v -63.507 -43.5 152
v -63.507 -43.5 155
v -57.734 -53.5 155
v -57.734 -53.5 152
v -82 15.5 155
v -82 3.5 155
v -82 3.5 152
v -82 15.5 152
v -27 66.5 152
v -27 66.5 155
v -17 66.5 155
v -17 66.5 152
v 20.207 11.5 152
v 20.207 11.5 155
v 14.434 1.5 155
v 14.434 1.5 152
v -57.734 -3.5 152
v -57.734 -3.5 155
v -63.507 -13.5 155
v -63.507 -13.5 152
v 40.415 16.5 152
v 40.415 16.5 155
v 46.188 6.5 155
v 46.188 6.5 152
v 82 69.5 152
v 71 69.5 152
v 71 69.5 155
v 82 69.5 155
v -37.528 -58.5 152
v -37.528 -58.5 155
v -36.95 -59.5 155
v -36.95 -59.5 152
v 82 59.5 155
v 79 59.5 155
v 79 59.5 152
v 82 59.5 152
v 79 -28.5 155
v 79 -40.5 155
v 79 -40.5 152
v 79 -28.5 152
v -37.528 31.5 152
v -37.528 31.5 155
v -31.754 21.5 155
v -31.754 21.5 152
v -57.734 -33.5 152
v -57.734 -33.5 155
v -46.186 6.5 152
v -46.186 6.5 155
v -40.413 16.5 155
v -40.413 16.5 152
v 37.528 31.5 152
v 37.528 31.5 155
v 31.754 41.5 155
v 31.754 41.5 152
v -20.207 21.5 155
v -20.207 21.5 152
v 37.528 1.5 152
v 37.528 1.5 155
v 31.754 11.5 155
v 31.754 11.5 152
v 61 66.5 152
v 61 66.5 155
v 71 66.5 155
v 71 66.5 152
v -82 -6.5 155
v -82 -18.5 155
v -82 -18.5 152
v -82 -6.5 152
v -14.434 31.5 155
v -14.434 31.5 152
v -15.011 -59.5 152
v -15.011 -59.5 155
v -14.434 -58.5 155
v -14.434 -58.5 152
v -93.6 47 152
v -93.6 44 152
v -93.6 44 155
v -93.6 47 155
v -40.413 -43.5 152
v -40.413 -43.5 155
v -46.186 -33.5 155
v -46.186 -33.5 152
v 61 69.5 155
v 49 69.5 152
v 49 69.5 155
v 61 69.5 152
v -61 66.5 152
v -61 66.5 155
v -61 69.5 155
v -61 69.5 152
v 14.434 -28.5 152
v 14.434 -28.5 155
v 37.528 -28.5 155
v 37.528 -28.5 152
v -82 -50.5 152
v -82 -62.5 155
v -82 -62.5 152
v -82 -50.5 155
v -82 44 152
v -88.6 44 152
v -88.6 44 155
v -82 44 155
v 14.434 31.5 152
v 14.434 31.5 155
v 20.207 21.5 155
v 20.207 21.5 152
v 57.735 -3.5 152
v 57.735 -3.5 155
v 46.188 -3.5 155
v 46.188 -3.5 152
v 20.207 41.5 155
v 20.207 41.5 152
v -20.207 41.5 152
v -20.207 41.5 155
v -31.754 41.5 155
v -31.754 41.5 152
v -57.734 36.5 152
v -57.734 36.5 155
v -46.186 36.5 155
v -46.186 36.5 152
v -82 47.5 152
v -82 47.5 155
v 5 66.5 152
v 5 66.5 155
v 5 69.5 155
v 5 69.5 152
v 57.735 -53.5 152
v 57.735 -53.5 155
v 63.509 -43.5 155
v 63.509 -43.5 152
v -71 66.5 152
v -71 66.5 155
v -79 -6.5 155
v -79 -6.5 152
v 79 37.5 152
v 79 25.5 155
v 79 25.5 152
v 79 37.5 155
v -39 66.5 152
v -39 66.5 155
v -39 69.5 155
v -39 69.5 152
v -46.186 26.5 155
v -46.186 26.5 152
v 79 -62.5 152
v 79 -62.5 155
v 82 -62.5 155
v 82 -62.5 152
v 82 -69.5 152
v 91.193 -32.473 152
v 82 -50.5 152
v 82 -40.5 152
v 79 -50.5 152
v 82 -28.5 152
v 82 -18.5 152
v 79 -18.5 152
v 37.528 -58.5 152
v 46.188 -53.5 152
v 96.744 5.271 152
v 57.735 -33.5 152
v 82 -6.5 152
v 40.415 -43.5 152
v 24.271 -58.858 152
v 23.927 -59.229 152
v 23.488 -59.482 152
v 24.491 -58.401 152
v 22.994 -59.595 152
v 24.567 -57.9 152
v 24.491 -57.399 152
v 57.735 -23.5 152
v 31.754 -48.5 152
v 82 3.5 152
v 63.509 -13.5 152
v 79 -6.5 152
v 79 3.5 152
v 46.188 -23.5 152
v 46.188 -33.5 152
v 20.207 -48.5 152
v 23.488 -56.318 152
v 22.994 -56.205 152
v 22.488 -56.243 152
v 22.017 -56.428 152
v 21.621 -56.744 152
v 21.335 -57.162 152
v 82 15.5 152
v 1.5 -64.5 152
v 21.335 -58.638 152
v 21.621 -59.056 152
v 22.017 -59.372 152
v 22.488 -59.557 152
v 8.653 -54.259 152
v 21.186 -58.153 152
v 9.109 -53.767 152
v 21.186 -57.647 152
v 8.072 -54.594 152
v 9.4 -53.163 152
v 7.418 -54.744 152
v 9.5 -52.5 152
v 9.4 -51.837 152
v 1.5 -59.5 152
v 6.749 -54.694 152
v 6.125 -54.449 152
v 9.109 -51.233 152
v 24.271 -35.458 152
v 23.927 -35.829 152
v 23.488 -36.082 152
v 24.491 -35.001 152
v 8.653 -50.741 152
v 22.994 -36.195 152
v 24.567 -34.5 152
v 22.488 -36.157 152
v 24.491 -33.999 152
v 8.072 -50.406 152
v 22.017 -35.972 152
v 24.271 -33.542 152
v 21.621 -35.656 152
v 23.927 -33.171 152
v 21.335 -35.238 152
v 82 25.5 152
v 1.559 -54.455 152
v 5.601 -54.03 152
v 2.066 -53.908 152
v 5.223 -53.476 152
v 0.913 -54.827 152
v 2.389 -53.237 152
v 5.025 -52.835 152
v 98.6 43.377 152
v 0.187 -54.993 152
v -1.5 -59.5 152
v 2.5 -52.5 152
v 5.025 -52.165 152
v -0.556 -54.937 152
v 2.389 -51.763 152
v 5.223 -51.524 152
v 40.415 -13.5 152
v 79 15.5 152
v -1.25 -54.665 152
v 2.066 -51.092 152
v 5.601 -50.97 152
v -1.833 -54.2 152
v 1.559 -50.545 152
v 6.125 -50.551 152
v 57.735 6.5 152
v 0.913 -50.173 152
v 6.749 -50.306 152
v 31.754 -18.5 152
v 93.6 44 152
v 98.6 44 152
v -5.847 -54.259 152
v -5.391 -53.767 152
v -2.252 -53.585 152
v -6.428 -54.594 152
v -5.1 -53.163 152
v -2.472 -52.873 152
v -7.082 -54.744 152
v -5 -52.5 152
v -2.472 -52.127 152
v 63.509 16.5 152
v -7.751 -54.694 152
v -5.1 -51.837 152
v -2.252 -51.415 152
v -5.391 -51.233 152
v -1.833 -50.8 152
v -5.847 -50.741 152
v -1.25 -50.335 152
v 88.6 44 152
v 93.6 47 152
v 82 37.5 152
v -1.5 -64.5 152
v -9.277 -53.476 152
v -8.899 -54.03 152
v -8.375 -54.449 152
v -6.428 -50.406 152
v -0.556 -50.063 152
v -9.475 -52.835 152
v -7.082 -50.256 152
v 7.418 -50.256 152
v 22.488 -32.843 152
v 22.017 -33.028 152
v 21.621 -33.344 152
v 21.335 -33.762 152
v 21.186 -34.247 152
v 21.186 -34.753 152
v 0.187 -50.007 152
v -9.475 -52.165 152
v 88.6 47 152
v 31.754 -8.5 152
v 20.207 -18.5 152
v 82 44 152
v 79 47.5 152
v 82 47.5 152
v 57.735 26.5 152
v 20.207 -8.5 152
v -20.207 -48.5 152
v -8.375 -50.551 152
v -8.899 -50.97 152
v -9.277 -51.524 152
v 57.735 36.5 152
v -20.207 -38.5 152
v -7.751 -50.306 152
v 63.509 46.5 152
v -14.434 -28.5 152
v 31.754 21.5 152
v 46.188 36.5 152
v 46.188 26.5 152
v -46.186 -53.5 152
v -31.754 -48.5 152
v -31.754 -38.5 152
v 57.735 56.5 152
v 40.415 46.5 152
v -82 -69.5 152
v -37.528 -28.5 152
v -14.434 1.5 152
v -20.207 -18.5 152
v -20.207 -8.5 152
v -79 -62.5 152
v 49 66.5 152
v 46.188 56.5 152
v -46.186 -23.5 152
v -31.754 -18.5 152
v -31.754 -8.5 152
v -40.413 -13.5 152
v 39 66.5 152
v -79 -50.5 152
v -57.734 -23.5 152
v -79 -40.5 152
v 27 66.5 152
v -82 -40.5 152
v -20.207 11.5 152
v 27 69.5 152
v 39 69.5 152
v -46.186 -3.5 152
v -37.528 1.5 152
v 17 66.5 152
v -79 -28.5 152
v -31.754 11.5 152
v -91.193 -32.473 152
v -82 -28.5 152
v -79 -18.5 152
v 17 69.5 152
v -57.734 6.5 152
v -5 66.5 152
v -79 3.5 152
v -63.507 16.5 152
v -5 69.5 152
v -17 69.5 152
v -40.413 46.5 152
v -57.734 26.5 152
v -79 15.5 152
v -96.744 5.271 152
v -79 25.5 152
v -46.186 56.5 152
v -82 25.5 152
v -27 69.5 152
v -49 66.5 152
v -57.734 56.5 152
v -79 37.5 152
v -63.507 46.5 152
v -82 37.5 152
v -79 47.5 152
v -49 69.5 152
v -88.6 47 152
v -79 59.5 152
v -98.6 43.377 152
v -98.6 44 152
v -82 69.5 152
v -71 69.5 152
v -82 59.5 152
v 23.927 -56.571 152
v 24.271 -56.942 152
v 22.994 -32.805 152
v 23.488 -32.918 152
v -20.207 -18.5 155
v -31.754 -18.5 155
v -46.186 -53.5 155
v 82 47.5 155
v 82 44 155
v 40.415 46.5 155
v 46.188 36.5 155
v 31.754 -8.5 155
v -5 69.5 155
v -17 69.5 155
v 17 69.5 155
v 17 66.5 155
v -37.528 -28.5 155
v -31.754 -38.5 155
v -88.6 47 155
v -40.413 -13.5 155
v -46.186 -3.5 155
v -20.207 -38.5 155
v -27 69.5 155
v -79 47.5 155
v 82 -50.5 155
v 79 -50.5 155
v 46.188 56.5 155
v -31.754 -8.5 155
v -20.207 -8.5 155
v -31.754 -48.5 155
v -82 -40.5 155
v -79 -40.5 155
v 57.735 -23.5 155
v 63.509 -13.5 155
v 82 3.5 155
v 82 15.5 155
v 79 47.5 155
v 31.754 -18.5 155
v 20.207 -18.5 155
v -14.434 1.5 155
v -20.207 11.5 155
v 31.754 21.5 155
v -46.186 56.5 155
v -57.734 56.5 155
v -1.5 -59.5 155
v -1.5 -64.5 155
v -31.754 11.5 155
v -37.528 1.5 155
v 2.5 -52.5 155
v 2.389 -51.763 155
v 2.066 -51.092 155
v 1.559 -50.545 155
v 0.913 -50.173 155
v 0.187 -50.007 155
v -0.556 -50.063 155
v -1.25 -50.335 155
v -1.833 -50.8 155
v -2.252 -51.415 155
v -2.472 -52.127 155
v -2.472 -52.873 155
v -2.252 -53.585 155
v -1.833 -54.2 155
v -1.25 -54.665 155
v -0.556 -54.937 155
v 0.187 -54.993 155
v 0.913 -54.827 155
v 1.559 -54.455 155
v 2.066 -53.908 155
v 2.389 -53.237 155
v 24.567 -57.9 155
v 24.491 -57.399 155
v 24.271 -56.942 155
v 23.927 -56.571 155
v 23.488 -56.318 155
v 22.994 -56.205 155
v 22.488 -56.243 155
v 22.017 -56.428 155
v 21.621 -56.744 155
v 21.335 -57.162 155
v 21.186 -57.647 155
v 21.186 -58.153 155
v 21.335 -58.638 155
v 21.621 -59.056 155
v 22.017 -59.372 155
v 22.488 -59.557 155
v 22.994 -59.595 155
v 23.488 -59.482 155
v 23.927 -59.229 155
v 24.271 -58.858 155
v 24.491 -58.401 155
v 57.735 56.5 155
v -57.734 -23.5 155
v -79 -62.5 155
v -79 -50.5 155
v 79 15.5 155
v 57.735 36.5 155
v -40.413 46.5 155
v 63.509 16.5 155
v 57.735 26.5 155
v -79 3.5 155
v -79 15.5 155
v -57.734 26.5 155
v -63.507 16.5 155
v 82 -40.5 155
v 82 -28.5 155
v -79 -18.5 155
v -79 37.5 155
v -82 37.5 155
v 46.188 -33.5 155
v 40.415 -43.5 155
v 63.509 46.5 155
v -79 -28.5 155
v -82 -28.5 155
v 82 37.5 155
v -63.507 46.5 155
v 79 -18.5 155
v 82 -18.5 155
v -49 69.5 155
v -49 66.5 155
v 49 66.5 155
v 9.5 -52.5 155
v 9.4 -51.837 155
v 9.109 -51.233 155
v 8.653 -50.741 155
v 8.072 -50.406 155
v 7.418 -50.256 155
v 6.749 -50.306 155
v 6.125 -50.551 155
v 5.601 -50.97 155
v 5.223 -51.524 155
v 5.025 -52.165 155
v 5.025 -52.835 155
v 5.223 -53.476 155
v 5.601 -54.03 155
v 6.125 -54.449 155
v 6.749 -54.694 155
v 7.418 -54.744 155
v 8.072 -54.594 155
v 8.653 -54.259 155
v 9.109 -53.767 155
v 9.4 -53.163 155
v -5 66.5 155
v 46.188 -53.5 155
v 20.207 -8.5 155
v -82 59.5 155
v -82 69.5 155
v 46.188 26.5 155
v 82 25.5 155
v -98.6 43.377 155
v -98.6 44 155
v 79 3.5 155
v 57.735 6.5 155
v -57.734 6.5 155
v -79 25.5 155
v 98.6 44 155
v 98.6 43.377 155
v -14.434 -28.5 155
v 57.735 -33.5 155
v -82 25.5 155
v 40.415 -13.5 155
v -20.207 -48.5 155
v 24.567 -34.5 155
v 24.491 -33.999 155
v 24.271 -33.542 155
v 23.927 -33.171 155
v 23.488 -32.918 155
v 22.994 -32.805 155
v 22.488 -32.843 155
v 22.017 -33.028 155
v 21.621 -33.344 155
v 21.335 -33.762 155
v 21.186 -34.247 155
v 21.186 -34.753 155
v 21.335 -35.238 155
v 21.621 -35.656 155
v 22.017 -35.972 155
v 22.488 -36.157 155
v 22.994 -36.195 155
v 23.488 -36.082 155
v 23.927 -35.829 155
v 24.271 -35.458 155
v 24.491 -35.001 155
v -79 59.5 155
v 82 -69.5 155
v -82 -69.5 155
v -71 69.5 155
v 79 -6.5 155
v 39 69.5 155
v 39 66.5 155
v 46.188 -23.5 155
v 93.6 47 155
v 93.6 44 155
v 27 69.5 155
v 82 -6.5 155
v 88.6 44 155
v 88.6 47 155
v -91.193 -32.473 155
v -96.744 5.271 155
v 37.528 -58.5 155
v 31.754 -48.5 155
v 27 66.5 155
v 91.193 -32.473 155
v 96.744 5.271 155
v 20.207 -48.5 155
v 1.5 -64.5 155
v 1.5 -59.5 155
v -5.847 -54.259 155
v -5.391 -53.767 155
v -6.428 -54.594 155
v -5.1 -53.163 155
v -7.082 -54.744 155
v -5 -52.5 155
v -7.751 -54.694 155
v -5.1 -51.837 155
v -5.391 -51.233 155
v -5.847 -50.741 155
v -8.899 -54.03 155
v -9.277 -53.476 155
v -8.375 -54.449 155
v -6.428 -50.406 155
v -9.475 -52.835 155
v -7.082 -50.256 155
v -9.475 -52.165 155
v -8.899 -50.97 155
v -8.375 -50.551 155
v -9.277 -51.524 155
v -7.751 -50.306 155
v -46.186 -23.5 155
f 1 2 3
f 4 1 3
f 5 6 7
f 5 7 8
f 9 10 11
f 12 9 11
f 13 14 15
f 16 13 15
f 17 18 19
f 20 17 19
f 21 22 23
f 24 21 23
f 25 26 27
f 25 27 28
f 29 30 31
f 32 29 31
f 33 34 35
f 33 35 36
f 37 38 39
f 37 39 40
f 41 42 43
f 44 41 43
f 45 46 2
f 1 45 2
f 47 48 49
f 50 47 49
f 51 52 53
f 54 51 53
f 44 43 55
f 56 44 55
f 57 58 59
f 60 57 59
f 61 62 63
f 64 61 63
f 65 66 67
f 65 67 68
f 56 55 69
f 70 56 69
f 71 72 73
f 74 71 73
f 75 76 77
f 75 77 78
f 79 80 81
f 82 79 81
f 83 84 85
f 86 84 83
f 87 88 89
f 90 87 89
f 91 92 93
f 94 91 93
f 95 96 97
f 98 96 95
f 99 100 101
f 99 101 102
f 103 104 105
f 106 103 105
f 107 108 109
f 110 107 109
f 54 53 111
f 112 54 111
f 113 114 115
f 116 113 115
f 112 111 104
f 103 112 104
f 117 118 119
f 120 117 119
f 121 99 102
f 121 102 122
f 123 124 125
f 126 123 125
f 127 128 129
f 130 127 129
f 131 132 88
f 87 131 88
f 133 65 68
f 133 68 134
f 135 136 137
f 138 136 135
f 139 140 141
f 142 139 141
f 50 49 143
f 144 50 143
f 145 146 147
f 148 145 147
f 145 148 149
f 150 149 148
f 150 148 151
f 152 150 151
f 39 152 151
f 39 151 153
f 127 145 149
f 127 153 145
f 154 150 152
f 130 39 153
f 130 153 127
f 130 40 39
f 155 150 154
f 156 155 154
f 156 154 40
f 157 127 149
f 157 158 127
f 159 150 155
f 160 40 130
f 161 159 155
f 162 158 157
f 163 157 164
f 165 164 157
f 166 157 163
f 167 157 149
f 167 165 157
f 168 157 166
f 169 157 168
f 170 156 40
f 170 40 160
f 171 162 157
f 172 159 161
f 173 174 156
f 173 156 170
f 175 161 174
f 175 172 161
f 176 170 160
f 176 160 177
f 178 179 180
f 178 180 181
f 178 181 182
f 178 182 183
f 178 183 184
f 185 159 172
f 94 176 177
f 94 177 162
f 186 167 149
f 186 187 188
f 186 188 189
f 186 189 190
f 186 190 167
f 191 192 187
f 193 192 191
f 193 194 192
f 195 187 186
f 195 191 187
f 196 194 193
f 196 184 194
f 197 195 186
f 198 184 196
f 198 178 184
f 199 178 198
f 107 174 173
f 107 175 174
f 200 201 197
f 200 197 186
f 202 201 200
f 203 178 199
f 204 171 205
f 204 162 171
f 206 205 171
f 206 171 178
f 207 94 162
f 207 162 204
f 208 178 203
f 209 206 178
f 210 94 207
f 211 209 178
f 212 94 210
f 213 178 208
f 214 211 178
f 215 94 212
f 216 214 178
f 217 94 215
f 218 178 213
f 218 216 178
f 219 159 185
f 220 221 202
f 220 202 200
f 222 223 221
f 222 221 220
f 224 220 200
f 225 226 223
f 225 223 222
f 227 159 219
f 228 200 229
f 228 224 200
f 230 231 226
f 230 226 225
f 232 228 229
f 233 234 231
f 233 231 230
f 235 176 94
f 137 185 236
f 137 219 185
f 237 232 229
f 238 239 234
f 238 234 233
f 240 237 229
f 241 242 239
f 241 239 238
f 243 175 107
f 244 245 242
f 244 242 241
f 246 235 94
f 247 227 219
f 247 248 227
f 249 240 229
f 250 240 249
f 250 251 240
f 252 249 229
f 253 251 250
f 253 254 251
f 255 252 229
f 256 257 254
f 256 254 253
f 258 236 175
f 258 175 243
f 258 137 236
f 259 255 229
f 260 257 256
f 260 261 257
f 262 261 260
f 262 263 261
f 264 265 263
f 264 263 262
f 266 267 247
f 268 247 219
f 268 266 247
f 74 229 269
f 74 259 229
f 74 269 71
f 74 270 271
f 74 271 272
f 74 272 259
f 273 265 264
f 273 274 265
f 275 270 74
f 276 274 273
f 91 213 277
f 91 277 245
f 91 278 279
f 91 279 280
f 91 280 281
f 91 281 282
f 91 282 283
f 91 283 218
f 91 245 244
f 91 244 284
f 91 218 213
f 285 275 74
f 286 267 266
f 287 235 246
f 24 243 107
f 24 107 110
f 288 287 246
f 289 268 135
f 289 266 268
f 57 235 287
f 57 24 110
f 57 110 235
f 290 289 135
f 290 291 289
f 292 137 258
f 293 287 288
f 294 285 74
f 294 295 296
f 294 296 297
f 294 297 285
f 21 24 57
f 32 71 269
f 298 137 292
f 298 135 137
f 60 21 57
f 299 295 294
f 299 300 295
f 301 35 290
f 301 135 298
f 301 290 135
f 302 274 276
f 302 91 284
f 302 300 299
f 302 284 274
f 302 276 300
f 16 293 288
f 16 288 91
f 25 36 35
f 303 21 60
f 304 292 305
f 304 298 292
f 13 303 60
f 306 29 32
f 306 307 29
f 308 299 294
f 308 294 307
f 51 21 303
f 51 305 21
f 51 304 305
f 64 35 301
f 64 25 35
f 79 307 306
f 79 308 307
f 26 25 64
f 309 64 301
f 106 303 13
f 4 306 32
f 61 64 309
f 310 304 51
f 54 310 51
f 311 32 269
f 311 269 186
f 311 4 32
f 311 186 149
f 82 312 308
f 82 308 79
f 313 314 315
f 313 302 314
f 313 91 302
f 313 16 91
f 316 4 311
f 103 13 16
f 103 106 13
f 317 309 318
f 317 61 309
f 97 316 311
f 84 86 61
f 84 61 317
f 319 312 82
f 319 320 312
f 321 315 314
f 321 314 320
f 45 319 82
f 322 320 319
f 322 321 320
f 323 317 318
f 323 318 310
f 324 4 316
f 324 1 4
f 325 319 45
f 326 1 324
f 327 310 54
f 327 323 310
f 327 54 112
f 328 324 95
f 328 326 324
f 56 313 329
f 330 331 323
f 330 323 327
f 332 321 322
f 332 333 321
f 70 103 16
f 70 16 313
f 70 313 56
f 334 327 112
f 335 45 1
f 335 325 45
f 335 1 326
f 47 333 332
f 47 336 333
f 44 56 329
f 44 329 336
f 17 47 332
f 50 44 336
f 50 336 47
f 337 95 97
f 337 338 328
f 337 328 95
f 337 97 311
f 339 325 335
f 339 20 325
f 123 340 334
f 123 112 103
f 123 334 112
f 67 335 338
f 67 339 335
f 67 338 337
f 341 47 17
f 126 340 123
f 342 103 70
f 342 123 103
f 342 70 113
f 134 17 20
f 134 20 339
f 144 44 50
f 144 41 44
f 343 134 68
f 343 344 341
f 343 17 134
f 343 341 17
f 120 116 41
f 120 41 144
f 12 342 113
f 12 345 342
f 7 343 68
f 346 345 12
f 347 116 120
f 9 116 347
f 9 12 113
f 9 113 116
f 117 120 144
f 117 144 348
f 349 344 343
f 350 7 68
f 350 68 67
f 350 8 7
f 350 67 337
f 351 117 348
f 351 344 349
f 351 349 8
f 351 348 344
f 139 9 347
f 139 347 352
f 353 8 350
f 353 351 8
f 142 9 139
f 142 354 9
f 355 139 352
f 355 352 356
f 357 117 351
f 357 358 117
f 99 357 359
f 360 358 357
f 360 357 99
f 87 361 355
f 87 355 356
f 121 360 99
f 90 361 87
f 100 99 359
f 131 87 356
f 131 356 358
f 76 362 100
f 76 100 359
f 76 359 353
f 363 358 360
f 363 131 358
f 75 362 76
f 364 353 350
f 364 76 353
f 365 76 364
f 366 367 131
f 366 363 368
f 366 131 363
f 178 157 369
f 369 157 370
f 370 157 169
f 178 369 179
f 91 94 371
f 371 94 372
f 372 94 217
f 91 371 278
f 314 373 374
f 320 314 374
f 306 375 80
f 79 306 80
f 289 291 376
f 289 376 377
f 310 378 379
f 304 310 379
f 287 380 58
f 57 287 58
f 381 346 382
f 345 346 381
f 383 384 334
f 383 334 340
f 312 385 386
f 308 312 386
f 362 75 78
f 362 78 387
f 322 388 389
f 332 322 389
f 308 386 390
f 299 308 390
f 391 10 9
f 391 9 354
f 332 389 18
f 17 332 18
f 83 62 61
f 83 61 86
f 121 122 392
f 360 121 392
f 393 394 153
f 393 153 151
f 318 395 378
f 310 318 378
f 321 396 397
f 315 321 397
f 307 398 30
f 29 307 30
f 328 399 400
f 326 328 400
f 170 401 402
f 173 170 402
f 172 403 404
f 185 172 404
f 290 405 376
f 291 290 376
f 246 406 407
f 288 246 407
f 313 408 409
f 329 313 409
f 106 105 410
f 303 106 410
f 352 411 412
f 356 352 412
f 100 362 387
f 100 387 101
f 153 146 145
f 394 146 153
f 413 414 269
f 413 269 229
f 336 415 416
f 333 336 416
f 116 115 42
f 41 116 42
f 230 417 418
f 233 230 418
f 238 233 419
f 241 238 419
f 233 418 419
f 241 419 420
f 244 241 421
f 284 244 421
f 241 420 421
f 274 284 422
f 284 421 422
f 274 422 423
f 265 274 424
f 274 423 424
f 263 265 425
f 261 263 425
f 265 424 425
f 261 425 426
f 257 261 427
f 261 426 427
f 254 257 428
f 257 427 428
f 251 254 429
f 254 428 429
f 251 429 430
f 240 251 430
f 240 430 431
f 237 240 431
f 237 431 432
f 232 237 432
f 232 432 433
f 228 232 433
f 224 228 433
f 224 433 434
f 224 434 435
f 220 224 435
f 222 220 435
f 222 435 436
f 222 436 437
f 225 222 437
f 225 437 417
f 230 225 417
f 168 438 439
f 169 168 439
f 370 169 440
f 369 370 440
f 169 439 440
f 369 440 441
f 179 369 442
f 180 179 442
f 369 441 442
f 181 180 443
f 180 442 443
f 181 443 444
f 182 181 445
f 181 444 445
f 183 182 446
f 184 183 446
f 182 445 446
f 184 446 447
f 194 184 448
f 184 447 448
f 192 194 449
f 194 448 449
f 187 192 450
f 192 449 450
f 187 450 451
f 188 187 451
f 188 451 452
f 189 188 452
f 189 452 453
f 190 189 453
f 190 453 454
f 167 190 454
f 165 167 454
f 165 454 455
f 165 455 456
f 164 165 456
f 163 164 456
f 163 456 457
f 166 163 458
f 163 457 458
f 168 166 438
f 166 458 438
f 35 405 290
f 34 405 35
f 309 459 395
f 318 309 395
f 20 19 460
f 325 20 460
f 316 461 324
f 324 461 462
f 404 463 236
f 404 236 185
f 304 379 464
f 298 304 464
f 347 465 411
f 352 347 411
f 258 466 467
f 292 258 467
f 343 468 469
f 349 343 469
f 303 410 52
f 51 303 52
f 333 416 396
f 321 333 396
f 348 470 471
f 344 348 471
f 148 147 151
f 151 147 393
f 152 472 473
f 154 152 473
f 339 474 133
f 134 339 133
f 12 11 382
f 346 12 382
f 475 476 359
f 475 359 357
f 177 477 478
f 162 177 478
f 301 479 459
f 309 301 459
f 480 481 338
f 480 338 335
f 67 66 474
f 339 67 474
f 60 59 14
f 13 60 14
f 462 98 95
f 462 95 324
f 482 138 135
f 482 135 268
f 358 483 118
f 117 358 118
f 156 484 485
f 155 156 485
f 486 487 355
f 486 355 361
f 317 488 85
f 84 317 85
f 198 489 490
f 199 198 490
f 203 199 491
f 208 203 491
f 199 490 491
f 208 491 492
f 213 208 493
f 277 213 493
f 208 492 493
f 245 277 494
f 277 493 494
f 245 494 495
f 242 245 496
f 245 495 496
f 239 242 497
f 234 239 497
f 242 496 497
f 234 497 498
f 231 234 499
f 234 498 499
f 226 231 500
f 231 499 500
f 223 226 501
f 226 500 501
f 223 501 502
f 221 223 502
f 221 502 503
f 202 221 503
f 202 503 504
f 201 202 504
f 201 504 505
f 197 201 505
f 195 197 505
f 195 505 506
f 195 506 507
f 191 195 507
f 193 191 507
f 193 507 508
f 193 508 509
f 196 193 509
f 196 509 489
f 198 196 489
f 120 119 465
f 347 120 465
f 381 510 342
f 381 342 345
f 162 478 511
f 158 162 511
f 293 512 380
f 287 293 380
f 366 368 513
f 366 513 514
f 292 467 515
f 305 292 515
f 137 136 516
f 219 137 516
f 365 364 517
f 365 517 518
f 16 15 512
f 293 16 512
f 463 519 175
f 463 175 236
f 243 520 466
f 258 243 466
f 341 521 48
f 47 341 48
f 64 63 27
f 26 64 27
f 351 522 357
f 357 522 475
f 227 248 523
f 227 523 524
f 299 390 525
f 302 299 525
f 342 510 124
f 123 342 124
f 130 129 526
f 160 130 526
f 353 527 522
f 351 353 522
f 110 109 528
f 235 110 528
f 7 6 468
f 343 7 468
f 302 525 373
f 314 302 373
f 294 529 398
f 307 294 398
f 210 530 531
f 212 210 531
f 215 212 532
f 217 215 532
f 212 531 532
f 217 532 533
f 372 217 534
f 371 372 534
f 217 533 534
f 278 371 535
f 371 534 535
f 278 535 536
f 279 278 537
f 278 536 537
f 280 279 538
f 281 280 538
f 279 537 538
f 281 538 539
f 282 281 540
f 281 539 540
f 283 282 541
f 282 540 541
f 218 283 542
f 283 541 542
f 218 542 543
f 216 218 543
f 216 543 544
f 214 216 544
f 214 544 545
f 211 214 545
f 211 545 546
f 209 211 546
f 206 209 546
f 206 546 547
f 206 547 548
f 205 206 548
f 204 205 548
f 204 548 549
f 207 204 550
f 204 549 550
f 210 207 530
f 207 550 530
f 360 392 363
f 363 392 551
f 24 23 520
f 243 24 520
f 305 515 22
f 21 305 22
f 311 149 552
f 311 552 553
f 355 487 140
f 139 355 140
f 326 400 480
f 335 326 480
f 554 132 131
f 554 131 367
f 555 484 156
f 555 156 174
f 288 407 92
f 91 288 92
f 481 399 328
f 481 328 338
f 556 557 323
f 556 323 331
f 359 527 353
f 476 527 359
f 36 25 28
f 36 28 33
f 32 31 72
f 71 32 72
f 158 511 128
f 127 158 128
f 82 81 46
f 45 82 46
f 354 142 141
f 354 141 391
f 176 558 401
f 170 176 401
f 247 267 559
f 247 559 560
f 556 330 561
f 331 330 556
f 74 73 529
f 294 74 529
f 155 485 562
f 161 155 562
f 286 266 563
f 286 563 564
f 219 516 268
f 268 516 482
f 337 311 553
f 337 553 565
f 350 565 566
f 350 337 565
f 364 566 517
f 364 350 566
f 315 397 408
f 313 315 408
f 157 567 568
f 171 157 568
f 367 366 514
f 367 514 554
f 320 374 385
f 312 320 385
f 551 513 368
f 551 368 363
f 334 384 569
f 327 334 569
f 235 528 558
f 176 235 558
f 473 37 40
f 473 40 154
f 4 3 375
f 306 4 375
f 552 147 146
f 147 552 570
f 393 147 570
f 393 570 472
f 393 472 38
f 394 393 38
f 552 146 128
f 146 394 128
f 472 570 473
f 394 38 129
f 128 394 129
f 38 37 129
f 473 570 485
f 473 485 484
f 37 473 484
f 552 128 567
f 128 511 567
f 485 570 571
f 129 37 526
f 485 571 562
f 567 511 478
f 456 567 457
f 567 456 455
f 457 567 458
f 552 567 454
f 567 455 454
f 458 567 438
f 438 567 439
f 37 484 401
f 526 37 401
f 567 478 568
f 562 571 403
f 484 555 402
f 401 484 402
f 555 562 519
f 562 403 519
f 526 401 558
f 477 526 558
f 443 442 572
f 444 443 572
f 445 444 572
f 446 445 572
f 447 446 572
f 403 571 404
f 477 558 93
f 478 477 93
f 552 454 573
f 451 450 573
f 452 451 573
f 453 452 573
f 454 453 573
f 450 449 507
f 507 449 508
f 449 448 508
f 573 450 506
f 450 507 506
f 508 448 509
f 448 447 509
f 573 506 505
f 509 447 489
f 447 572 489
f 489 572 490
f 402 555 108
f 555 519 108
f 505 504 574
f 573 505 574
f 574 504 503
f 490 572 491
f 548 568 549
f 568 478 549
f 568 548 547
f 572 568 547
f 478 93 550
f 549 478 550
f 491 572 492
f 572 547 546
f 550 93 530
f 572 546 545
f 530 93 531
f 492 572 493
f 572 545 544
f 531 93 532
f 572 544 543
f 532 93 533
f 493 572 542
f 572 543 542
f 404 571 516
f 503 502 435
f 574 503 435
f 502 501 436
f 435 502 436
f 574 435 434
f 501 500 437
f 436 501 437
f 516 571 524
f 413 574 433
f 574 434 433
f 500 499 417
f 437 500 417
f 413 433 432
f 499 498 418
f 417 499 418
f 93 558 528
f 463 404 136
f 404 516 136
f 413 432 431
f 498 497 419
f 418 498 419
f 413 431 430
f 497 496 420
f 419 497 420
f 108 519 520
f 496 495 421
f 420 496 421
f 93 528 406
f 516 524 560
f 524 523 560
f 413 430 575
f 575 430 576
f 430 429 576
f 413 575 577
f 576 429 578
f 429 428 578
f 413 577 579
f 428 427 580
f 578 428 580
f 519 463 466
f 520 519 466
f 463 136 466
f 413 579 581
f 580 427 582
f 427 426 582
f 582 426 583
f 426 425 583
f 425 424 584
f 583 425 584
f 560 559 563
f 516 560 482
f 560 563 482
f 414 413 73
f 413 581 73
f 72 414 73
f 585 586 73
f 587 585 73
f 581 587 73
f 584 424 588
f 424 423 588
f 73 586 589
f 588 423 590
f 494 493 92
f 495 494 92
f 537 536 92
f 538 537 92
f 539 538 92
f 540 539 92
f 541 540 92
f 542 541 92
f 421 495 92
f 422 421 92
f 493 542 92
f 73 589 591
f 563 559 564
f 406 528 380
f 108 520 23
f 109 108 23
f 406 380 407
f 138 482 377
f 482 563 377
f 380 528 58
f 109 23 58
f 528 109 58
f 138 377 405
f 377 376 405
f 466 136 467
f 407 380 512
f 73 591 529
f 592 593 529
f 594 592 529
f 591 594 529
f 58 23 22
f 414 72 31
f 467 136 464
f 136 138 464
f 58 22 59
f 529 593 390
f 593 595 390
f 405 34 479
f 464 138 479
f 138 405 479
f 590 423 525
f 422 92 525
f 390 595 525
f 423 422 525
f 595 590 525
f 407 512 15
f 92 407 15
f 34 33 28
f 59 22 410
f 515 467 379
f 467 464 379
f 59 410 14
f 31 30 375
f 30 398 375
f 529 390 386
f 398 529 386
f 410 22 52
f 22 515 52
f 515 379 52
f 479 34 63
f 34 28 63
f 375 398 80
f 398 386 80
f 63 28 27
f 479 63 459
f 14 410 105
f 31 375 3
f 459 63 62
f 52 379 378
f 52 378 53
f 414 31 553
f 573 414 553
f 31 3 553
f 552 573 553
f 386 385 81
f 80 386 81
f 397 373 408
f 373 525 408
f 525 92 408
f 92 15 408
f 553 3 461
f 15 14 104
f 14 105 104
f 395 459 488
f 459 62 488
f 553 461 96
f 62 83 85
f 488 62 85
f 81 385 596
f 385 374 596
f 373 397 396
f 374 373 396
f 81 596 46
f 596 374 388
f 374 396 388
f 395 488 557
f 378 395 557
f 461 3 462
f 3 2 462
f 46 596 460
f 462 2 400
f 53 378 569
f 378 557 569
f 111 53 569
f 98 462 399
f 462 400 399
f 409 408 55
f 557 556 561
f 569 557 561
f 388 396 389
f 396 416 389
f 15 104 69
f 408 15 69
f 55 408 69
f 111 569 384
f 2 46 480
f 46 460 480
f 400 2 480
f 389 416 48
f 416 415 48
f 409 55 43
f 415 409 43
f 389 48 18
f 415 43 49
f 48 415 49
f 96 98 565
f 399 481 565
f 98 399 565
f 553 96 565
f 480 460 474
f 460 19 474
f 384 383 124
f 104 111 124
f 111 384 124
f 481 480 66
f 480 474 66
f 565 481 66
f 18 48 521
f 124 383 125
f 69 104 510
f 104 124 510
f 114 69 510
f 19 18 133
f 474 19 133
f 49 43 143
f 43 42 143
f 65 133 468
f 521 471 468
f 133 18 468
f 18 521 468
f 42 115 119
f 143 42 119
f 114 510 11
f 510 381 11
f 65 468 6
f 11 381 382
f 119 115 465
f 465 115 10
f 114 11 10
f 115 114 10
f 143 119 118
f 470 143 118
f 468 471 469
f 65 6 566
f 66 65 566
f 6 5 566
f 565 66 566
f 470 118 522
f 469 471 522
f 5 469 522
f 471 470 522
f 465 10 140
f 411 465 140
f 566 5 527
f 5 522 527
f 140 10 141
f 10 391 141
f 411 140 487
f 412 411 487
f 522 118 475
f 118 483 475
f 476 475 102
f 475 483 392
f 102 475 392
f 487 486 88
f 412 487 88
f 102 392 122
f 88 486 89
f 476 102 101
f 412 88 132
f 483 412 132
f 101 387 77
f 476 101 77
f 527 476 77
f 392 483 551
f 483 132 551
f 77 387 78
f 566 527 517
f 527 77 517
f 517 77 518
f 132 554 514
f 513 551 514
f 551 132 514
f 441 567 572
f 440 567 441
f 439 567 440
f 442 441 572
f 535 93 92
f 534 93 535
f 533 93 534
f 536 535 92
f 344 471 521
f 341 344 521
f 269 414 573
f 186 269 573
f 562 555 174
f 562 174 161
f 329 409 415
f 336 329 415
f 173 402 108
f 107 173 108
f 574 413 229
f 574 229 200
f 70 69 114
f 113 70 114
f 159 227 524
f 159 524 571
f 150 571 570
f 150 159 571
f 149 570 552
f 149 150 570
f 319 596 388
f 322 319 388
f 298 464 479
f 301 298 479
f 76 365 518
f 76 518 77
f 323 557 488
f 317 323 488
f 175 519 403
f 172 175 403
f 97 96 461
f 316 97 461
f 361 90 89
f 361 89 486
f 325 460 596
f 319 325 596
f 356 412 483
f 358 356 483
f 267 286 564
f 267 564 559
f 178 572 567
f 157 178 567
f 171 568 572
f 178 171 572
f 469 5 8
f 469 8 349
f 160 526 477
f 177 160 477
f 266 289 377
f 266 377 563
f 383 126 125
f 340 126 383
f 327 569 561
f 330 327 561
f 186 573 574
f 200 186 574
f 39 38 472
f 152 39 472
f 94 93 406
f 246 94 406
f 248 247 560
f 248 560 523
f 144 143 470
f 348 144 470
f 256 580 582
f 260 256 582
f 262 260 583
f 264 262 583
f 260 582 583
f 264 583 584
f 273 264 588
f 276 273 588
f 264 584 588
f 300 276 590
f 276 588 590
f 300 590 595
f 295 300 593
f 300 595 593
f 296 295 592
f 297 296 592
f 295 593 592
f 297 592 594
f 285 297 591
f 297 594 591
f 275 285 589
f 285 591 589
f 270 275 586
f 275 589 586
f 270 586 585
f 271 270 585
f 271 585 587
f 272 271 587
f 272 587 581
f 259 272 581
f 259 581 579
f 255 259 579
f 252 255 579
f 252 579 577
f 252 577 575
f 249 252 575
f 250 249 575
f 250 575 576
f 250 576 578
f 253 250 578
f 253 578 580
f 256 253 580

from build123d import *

# Parameters (mm, degrees)
BOSS_EXTRUDE1_DEPTH = 3
SKETCH2_W           = 10
SKETCH2_H           = 3
SKETCH2_W_2         = 3
SKETCH2_H_2         = 12
CUT_EXTRUDE1_DEPTH  = 10
SKETCH5_R           = 1.7
SKETCH5_W           = 3
SKETCH5_H           = 5
CUT_EXTRUDE2_DEPTH  = 3
SKETCH6_R           = 2.5
SKETCH6_R_2         = 2.25
CUT_EXTRUDE3_DEPTH  = 10


with BuildPart() as part:
    # Sketch1 → Boss-Extrude1 (new body)
    with BuildSketch(Plane.XY.offset(152)):
        with BuildLine():
            Line((-82, 69.5), (82, 69.5))
            Line((82, 69.5), (82, 44))
            Line((82, 44), (88.6, 44))
            Line((88.6, 44), (88.6, 47))
            Line((88.6, 47), (93.6, 47))
            Line((93.6, 47), (93.6, 44))
            Line((93.6, 44), (98.6, 44))
            Line((98.6, 44), (98.6, 43.377104502))
            ThreePointArc((98.6, 43.377104502), (94.427800977, -13.668492876), (82, -69.5))
            Line((82, -69.5), (-82, -69.5))
            ThreePointArc((-82, -69.5), (-94.427800977, -13.668492876), (-98.6, 43.377104502))
            Line((-98.6, 43.377104502), (-98.6, 44))
            Line((-98.6, 44), (-93.6, 44))
            Line((-93.6, 44), (-93.6, 47))
            Line((-93.6, 47), (-88.6, 47))
            Line((-88.6, 47), (-88.6, 44))
            Line((-88.6, 44), (-82, 44))
            Line((-82, 44), (-82, 69.5))
        make_face()
    extrude(amount=BOSS_EXTRUDE1_DEPTH)

    # Sketch2 → Cut-Extrude1 (cut)
    with BuildSketch(Plane.XY.offset(155)):
        with Locations((0, 68)):
            Rectangle(SKETCH2_W, SKETCH2_H)
        with Locations((-22, 68)):
            Rectangle(SKETCH2_W, SKETCH2_H)
        with Locations((22, 68)):
            Rectangle(SKETCH2_W, SKETCH2_H)
        with Locations((-44, 68)):
            Rectangle(SKETCH2_W, SKETCH2_H)
        with Locations((44, 68)):
            Rectangle(SKETCH2_W, SKETCH2_H)
        with Locations((-66, 68)):
            Rectangle(SKETCH2_W, SKETCH2_H)
        with Locations((66, 68)):
            Rectangle(SKETCH2_W, SKETCH2_H)
        with Locations((-80.5, 53.5)):
            Rectangle(SKETCH2_W_2, SKETCH2_H_2)
        with Locations((80.5, 53.5)):
            Rectangle(SKETCH2_W_2, SKETCH2_H_2)
        with Locations((-80.5, 31.5)):
            Rectangle(SKETCH2_W_2, SKETCH2_H_2)
        with Locations((-80.5, 9.5)):
            Rectangle(SKETCH2_W_2, SKETCH2_H_2)
        with Locations((-80.5, -12.5)):
            Rectangle(SKETCH2_W_2, SKETCH2_H_2)
        with Locations((-80.5, -34.5)):
            Rectangle(SKETCH2_W_2, SKETCH2_H_2)
        with Locations((-80.5, -56.5)):
            Rectangle(SKETCH2_W_2, SKETCH2_H_2)
        with Locations((80.5, -56.5)):
            Rectangle(SKETCH2_W_2, SKETCH2_H_2)
        with Locations((80.5, -34.5)):
            Rectangle(SKETCH2_W_2, SKETCH2_H_2)
        with Locations((80.5, -12.5)):
            Rectangle(SKETCH2_W_2, SKETCH2_H_2)
        with Locations((80.5, 9.5)):
            Rectangle(SKETCH2_W_2, SKETCH2_H_2)
        with Locations((80.5, 31.5)):
            Rectangle(SKETCH2_W_2, SKETCH2_H_2)
    extrude(amount=-CUT_EXTRUDE1_DEPTH, mode=Mode.SUBTRACT)

    # Sketch5 → Cut-Extrude2 (cut)
    with BuildSketch(Plane.XY.offset(155)):
        with Locations((22.86677044, -57.9)):
            Circle(SKETCH5_R)
        with Locations((22.86677044, -34.5)):
            Circle(SKETCH5_R)
        Polygon((63.508529611, 46.5), (57.735026919, 56.5), (46.188021535, 56.5), (40.414518843, 46.5), (46.188021535, 36.5), (57.735026919, 36.5), align=None)
        Polygon((31.754264805, 41.5), (20.207259422, 41.5), (14.43375673, 31.5), (20.207259422, 21.5), (31.754264805, 21.5), (37.527767497, 31.5), align=None)
        Polygon((-20.207259422, 41.5), (-31.754264805, 41.5), (-37.527767497, 31.5), (-31.754264805, 21.5), (-20.207259422, 21.5), (-14.43375673, 31.5), align=None)
        Polygon((-20.207259422, 11.5), (-31.754264805, 11.5), (-37.527767497, 1.5), (-31.754264805, -8.5), (-20.207259422, -8.5), (-14.43375673, 1.5), align=None)
        Polygon((31.754264805, 11.5), (20.207259422, 11.5), (14.43375673, 1.5), (20.207259422, -8.5), (31.754264805, -8.5), (37.527767497, 1.5), align=None)
        Polygon((63.508529611, 16.5), (57.735026919, 26.5), (46.188021535, 26.5), (40.414518843, 16.5), (46.188021535, 6.5), (57.735026919, 6.5), align=None)
        Polygon((-20.207259422, -18.5), (-31.754264805, -18.5), (-37.527767497, -28.5), (-31.754264805, -38.5), (-20.207259422, -38.5), (-14.43375673, -28.5), align=None)
        Polygon((31.754264805, -18.5), (20.207259422, -18.5), (14.43375673, -28.5), (37.527767497, -28.5), align=None)
        Polygon((63.508529611, -13.5), (57.735026919, -3.5), (46.188021535, -3.5), (40.414518843, -13.5), (46.188021535, -23.5), (57.735026919, -23.5), align=None)
        Polygon((-20.207259422, -48.5), (-31.754264805, -48.5), (-37.527767497, -58.5), (-36.950417228, -59.5), (-15.011106999, -59.5), (-14.43375673, -58.5), align=None)
        Polygon((31.754264805, -48.5), (20.207259422, -48.5), (37.527767497, -58.5), align=None)
        Polygon((63.508529611, -43.5), (57.735026919, -33.5), (46.188021535, -33.5), (40.414518843, -43.5), (46.188021535, -53.5), (57.735026919, -53.5), align=None)
        Polygon((-40.412994616, 46.5), (-46.186497308, 56.5), (-57.733502692, 56.5), (-63.507005384, 46.5), (-57.733502692, 36.5), (-46.186497308, 36.5), align=None)
        Polygon((-40.412994616, 16.5), (-46.186497308, 26.5), (-57.733502692, 26.5), (-63.507005384, 16.5), (-57.733502692, 6.5), (-46.186497308, 6.5), align=None)
        Polygon((-40.412994616, -13.5), (-46.186497308, -3.5), (-57.733502692, -3.5), (-63.507005384, -13.5), (-57.733502692, -23.5), (-46.186497308, -23.5), align=None)
        Polygon((-40.412994616, -43.5), (-46.186497308, -33.5), (-57.733502692, -33.5), (-63.507005384, -43.5), (-57.733502692, -53.5), (-46.186497308, -53.5), align=None)
        with Locations((0, -62)):
            Rectangle(SKETCH5_W, SKETCH5_H)
    extrude(amount=-CUT_EXTRUDE2_DEPTH, mode=Mode.SUBTRACT)

    # Sketch6 → Cut-Extrude3 (cut)
    with BuildSketch(Plane.XY.offset(155)):
        with Locations((0, -52.5)):
            Circle(SKETCH6_R)
        with Locations((-7.25, -52.5)):
            Circle(SKETCH6_R_2)
        with Locations((7.25, -52.5)):
            Circle(SKETCH6_R_2)
    extrude(amount=-CUT_EXTRUDE3_DEPTH, mode=Mode.SUBTRACT)


solid = part.part
